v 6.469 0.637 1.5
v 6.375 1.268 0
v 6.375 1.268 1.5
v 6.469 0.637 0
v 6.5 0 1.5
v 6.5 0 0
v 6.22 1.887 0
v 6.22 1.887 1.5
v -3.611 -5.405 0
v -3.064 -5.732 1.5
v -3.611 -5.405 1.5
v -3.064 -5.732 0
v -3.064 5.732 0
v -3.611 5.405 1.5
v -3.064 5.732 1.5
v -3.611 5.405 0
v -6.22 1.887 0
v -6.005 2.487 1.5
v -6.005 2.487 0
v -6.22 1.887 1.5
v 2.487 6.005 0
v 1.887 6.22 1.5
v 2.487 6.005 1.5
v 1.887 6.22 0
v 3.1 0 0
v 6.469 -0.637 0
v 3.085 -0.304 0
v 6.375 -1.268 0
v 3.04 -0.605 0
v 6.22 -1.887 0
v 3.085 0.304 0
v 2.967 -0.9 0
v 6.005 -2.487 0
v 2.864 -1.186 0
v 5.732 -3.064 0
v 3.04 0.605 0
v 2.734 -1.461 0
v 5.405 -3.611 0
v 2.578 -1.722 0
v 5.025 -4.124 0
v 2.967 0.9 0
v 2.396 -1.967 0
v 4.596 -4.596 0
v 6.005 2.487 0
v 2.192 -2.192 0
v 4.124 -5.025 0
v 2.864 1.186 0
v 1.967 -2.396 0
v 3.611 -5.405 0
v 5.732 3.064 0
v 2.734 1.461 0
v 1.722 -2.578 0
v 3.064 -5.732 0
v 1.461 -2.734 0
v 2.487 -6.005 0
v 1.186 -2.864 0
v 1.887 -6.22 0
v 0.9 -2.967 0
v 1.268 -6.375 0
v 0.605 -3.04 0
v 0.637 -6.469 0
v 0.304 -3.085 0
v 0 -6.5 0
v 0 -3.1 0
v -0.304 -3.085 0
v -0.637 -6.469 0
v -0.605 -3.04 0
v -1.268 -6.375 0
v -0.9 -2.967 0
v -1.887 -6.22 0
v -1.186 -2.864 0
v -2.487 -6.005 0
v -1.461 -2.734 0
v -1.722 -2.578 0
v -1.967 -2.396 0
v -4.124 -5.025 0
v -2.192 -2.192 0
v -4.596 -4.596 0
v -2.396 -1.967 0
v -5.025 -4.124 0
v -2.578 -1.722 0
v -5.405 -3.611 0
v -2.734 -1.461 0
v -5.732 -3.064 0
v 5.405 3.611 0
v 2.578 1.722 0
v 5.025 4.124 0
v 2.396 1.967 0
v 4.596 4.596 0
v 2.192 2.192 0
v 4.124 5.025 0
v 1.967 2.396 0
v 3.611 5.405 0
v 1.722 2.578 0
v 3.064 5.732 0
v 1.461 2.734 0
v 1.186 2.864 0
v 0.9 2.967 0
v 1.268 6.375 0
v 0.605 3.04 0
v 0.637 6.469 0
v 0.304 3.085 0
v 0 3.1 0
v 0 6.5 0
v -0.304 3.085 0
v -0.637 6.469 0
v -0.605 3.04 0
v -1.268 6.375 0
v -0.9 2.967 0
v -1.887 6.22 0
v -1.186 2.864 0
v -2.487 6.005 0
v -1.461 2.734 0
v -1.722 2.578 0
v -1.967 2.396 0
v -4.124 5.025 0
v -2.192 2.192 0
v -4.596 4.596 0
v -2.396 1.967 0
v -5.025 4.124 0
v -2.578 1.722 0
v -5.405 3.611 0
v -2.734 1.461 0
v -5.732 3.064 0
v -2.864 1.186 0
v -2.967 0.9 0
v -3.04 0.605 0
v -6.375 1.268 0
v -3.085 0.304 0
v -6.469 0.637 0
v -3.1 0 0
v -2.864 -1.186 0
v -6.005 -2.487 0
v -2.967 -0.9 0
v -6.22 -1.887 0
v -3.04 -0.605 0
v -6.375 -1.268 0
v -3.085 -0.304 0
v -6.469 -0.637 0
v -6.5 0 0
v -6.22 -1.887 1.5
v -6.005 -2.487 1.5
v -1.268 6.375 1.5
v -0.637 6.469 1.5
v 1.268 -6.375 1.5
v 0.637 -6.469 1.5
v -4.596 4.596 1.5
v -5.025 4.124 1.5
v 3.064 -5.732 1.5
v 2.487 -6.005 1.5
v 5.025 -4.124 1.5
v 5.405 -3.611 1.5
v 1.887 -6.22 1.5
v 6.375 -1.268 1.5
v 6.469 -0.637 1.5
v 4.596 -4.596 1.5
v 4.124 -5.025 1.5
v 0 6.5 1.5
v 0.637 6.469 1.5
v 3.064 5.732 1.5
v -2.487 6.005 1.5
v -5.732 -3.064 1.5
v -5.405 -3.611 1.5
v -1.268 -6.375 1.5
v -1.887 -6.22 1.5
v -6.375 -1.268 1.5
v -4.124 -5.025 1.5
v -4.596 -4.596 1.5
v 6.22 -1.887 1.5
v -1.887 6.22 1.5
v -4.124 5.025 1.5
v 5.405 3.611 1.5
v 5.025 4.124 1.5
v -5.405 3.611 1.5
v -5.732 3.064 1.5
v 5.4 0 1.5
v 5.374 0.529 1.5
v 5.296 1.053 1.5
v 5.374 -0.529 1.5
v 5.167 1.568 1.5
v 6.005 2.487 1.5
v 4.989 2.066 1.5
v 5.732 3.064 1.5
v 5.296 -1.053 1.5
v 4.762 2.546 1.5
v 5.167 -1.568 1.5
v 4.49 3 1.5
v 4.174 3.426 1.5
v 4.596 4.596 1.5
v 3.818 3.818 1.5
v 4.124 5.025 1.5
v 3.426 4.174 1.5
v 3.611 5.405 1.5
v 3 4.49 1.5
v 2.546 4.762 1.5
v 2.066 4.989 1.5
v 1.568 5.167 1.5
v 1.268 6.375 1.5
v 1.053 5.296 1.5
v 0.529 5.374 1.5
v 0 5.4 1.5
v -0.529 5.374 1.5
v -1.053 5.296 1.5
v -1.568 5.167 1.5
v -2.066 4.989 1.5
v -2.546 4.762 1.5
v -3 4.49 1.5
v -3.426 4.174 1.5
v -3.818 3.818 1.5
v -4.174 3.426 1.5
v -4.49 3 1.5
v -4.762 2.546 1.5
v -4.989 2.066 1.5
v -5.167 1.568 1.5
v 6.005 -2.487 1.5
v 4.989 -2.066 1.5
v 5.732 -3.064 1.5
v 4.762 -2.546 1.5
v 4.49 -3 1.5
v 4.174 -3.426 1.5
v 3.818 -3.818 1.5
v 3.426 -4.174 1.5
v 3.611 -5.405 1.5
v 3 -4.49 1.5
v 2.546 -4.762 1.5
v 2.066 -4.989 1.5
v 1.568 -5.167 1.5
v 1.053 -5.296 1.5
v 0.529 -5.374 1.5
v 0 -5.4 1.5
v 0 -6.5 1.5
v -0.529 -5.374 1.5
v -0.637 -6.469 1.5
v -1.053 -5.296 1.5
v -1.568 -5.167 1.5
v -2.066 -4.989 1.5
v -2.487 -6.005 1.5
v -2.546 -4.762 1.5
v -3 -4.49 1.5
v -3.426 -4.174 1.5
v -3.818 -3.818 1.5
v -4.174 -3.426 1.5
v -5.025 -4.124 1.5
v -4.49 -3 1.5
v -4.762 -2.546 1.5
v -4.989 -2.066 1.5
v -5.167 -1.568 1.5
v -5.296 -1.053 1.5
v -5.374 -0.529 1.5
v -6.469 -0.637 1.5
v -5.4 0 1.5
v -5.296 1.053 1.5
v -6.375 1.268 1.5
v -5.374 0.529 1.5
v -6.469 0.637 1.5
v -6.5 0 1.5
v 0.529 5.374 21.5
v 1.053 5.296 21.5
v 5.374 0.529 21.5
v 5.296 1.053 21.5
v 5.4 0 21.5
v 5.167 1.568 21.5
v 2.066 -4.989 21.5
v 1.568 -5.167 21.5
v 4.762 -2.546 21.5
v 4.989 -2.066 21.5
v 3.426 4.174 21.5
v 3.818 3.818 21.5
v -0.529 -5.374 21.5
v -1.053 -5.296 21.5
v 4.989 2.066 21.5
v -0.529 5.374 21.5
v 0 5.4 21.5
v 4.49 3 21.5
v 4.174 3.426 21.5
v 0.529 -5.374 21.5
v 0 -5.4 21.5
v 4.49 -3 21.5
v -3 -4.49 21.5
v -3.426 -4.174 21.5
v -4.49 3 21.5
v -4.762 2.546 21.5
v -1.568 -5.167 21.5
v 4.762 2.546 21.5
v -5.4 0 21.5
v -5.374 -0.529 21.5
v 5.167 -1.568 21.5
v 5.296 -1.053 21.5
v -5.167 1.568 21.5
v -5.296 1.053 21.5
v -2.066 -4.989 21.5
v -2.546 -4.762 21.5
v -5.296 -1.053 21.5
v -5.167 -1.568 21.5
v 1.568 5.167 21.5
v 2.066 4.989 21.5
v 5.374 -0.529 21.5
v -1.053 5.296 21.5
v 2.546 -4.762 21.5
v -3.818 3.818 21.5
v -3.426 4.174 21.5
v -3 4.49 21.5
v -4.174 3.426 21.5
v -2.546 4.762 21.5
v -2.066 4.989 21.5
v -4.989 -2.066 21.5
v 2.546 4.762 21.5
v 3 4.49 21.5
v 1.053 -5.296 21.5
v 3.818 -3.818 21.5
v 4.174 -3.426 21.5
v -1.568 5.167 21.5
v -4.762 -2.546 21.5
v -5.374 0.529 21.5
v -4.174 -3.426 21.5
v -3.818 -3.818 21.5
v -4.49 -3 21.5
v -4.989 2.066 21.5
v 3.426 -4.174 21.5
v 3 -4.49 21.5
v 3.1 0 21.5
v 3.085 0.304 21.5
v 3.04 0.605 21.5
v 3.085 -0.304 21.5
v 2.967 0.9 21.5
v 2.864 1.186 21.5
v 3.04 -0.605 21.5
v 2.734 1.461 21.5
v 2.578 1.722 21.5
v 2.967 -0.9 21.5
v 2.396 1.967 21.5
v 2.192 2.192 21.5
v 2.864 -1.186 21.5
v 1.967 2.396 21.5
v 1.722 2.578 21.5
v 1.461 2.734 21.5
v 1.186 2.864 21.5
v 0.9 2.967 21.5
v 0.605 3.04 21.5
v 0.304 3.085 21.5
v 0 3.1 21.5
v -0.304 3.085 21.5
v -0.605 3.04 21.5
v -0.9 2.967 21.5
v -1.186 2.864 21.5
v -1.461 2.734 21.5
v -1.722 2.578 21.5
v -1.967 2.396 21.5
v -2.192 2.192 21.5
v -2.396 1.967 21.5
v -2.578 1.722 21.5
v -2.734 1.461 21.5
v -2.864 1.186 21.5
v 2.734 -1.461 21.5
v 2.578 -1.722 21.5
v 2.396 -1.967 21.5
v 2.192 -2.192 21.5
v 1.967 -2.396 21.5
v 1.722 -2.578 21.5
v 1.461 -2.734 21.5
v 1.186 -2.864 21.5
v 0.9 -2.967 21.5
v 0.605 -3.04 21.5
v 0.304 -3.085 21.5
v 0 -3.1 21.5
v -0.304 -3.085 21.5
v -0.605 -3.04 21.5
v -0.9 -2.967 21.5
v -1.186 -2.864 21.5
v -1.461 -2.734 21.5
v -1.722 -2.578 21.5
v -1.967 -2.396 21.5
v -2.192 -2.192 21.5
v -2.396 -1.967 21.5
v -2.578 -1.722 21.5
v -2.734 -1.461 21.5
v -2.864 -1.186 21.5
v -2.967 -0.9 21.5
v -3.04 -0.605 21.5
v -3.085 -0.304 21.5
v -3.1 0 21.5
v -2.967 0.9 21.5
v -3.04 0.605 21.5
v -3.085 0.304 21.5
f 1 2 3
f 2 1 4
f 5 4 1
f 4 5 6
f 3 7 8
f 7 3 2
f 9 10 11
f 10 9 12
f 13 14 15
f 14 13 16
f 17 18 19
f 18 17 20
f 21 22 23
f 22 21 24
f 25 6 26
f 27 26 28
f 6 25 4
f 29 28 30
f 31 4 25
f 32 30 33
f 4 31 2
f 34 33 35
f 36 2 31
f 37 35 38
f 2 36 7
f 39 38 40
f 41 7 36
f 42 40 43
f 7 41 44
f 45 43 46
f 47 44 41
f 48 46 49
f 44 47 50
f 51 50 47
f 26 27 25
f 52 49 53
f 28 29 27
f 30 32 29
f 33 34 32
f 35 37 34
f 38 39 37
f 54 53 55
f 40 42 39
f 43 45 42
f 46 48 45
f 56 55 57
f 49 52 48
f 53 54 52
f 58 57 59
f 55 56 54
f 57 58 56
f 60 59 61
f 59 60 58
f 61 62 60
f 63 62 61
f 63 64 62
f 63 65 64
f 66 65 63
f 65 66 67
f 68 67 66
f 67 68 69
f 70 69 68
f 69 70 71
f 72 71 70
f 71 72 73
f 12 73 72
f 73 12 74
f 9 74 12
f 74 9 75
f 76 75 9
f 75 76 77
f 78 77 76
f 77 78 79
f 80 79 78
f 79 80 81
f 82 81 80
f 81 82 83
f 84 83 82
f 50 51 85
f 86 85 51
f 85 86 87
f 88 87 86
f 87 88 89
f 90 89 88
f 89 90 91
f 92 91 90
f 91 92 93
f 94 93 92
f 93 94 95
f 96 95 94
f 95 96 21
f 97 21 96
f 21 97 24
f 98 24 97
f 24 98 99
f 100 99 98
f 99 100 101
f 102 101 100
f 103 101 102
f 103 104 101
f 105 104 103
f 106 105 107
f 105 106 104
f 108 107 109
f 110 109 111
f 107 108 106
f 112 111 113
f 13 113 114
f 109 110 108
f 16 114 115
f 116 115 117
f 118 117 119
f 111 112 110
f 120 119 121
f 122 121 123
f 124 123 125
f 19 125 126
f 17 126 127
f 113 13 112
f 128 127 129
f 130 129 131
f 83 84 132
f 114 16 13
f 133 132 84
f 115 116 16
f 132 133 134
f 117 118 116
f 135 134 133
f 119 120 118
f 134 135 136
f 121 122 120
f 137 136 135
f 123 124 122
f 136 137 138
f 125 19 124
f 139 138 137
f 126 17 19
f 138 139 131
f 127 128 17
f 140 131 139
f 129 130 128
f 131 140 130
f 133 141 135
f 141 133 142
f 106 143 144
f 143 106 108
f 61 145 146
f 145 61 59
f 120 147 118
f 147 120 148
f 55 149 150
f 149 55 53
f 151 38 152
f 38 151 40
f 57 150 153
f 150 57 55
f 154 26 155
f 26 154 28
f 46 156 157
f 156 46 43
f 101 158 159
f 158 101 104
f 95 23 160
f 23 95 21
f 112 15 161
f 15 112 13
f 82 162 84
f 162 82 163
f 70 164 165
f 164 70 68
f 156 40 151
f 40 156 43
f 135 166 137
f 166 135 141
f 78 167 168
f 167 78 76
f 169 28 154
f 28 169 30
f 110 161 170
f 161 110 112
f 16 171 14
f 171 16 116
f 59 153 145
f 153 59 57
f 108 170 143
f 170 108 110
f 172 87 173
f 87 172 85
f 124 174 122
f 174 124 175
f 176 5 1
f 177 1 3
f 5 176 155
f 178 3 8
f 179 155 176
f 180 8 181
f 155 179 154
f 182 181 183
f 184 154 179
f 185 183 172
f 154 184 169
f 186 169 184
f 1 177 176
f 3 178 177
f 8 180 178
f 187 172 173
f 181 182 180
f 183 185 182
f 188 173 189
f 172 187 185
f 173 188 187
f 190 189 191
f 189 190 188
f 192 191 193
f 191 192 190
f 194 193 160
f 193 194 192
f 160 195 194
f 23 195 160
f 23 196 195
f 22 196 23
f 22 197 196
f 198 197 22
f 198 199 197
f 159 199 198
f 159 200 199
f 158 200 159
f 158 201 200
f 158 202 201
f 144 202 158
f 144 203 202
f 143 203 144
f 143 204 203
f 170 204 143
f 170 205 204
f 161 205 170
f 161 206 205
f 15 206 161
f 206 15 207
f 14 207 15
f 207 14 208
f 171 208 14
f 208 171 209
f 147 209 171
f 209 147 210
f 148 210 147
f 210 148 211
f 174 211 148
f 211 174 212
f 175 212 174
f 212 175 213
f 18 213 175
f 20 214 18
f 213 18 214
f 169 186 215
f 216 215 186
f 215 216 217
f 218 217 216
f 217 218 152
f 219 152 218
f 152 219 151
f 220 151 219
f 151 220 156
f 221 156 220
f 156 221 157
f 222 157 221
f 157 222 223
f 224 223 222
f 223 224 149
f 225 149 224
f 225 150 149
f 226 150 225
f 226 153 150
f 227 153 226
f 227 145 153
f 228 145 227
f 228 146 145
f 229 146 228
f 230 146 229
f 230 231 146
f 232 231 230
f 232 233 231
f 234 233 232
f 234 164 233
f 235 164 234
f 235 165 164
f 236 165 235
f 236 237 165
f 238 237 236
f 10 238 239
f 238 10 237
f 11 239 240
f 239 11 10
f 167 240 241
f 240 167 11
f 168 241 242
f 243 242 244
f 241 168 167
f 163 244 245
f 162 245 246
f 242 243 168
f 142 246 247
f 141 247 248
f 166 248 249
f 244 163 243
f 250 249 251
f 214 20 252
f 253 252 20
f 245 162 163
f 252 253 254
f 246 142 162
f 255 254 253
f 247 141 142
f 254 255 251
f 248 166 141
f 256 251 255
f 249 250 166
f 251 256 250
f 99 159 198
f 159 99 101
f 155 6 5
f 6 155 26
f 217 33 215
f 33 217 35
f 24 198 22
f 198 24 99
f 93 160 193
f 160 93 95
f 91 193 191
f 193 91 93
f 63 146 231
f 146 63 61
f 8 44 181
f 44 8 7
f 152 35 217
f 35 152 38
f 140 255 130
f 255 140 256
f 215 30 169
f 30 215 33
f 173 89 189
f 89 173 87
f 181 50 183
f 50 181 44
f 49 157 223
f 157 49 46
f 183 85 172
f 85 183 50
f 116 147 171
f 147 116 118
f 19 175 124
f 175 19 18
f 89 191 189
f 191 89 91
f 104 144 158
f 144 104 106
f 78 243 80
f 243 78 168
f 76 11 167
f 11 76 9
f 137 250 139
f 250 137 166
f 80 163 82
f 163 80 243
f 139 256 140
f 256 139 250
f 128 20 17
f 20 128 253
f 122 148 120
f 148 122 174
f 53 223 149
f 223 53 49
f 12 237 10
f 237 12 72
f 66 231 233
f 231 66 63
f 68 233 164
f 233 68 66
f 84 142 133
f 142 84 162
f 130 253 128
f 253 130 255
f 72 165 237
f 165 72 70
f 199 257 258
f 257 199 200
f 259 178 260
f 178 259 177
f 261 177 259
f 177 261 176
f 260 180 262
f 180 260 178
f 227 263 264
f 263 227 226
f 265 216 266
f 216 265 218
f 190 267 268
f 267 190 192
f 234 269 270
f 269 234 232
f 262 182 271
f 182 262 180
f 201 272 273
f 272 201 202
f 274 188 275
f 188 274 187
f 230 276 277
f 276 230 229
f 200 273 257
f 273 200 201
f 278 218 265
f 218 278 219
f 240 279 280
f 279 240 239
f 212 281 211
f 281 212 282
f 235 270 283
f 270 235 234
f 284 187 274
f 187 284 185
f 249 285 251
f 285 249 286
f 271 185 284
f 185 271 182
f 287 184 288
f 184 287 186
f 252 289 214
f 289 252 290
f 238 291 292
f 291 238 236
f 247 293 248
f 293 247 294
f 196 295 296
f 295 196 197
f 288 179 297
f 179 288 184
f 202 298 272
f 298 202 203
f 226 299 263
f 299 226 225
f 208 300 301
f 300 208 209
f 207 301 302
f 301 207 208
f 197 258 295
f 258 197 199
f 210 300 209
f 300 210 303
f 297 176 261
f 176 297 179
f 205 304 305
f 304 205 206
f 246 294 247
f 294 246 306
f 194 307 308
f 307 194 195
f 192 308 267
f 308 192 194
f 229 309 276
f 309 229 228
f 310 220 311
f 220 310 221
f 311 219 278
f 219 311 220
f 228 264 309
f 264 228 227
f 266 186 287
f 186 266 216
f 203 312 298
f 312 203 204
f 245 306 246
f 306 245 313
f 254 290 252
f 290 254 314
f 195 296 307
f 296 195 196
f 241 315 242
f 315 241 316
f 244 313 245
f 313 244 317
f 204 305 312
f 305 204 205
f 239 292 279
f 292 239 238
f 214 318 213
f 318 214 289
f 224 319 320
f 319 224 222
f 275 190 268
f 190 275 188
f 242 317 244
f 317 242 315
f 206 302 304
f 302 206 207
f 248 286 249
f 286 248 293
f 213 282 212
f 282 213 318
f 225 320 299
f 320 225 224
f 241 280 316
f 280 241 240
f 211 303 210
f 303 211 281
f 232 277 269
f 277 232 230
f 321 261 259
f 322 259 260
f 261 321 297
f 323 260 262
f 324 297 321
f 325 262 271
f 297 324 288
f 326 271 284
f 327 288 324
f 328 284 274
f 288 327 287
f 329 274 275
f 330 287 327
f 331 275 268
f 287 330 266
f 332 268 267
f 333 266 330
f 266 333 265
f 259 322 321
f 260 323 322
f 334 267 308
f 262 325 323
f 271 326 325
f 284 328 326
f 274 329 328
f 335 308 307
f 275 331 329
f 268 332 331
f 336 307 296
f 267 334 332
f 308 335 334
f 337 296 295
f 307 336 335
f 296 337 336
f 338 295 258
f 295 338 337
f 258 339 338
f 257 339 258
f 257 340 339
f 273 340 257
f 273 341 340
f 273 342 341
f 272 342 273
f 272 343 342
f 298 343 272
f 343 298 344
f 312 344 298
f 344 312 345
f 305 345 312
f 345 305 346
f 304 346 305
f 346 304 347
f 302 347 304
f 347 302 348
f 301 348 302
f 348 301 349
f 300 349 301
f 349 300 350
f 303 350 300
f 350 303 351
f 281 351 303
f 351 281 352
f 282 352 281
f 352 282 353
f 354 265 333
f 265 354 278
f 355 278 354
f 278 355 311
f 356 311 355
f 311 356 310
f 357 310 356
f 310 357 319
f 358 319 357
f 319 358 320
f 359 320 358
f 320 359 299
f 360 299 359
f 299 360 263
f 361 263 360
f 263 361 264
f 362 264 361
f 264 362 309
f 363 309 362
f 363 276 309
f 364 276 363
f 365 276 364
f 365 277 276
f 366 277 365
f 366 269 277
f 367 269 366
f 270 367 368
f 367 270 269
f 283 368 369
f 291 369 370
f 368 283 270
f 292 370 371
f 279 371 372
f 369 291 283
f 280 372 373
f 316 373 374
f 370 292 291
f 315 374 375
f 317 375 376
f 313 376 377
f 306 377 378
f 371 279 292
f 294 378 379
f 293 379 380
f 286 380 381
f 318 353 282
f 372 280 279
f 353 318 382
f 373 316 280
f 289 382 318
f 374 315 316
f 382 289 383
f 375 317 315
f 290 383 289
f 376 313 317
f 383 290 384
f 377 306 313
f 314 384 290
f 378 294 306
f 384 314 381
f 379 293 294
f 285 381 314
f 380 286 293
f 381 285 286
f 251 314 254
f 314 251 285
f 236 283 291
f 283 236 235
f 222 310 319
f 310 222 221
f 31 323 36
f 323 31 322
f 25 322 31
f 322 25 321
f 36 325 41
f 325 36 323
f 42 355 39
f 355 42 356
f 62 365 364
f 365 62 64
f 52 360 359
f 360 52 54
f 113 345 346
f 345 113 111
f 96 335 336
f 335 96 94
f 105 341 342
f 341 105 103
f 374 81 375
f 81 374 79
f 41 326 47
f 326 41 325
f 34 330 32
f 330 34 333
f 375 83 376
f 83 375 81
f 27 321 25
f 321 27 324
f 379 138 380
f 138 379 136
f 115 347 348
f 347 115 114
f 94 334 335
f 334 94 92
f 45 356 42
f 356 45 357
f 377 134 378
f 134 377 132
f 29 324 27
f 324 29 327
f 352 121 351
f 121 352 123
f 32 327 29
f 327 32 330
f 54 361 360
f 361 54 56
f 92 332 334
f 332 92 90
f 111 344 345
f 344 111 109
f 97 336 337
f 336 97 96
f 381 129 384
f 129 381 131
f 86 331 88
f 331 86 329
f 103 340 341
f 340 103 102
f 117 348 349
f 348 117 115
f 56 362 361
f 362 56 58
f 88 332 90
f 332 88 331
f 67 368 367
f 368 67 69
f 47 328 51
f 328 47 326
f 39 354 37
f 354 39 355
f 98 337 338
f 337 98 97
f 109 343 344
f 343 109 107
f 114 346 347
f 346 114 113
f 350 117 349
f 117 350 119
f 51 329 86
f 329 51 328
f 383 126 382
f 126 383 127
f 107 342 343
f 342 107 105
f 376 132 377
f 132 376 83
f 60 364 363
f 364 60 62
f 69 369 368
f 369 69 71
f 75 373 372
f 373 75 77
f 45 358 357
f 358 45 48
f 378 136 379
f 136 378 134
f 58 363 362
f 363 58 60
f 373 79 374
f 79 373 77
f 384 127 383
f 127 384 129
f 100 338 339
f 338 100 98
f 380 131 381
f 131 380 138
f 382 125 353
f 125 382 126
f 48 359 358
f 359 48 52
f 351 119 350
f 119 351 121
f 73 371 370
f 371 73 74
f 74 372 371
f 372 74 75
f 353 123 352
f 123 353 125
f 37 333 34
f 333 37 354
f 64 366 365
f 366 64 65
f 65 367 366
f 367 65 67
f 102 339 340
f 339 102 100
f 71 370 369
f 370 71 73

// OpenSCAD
// Adapter sleeve: 0.2 mL PCR tube in 1.5 mL rack hole
// Print orientation: collar on bed (z = 0), sleeve body rises to z = 21.5

$fn = 64;

// --- Dimensions (mm) ---
collar_d      = 13;    // collar outer diameter
collar_h      = 1.5;   // collar thickness
sleeve_od     = 10.8;  // sleeve body outer diameter
sleeve_h      = 20;    // sleeve body height (z = 1.5 to 21.5)
bore_d        = 6.2;   // straight through-bore diameter
eps           = 0.5;   // cutter overshoot past faces

total_h = collar_h + sleeve_h;  // 21.5 mm overall

difference() {
    union() {
        // Collar
        cylinder(d = collar_d, h = collar_h);
        // Sleeve body (slightly overlapping the collar for a clean union)
        translate([0, 0, collar_h - 0.01])
            cylinder(d = sleeve_od, h = sleeve_h + 0.01);
    }
    // Full-height bore, open at both ends
    translate([0, 0, -eps])
        cylinder(d = bore_d, h = total_h + 2 * eps);
}
